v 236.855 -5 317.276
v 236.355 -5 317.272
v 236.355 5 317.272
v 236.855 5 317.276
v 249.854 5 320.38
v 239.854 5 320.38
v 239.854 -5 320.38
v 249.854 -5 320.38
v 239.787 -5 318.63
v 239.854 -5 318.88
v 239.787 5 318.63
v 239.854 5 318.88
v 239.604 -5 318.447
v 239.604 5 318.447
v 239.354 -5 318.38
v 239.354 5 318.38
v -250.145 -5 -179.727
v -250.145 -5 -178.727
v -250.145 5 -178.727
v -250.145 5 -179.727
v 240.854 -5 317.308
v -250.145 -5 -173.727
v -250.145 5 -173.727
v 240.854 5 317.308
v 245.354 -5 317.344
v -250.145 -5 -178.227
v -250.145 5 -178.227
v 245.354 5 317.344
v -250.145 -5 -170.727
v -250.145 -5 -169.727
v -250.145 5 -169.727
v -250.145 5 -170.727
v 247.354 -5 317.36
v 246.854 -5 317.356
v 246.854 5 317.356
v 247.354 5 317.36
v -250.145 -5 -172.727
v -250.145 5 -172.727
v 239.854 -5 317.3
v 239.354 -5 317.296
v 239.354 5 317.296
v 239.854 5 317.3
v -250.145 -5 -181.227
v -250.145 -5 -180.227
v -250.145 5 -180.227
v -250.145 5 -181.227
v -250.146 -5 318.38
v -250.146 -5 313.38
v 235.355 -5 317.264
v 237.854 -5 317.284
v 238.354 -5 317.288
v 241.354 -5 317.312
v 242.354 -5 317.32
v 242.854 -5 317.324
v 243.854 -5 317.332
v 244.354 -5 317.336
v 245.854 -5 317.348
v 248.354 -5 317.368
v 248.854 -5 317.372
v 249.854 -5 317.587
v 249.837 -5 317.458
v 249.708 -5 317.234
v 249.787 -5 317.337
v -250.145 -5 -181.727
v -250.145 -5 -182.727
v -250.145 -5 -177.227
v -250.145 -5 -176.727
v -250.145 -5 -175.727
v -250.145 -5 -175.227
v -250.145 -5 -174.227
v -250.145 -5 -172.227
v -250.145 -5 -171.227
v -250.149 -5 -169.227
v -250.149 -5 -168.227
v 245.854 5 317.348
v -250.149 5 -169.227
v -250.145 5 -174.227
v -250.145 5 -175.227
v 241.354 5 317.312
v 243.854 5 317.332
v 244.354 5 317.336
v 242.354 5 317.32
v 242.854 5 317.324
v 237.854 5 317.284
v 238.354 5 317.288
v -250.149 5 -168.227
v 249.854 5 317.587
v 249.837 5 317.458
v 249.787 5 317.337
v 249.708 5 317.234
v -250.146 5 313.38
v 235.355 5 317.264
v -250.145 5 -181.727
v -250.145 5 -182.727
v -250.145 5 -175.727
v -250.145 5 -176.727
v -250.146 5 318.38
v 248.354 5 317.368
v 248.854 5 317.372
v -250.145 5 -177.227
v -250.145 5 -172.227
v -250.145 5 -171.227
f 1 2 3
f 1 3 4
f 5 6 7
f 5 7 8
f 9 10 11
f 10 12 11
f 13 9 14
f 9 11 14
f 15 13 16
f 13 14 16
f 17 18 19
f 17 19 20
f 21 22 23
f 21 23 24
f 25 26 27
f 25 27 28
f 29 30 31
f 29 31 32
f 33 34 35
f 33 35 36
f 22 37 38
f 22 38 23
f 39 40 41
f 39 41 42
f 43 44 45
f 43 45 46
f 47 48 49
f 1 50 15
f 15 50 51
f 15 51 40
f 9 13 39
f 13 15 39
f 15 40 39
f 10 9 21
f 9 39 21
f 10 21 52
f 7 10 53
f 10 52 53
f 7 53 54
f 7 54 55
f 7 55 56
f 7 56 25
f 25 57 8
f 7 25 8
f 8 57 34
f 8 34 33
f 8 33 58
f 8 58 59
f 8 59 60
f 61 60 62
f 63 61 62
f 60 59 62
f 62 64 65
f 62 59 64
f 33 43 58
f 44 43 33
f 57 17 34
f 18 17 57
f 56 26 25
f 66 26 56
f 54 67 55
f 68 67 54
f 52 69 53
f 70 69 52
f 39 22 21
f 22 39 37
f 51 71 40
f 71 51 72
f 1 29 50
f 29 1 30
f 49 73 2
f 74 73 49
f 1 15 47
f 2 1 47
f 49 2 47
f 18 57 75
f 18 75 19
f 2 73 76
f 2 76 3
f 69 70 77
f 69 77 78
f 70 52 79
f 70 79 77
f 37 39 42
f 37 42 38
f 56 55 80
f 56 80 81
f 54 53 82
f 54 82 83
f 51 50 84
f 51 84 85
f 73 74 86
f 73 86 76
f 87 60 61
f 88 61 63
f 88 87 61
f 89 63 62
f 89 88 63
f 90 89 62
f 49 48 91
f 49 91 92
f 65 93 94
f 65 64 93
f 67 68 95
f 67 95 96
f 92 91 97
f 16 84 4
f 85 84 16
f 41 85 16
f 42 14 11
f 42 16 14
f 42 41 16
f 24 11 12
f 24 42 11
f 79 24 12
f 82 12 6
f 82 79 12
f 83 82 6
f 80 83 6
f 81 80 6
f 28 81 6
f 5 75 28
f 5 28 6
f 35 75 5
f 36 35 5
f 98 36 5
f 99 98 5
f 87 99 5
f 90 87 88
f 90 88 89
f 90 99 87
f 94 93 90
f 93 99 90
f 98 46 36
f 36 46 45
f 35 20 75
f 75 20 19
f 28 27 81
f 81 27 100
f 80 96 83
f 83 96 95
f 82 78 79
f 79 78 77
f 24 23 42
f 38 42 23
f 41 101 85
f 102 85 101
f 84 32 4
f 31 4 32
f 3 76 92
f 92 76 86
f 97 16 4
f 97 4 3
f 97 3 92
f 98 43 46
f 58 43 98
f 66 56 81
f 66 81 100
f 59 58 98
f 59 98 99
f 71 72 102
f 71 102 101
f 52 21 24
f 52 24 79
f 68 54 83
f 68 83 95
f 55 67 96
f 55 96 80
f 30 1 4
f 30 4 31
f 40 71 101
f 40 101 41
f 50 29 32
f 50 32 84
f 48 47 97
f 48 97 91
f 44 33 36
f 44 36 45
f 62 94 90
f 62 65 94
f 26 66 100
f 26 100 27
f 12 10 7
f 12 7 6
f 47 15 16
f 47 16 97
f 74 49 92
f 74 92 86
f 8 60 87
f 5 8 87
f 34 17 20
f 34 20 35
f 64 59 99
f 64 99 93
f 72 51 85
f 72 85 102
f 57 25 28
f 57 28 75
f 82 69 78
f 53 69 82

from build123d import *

# Parameters (mm, degrees)
F1_DEPTH = 5
F3_W     = 10
F3_H     = 10
F4_DEPTH = 2
F5_R     = 0.5


with BuildPart() as f1:
    # F0 (on Front) → F1 (new body, symmetric)
    with BuildSketch(Plane.XZ):
        Polygon((249.854166, 317.379943), (249.854166, 318.379943), (-250.145834, 318.379943), (-250.145834, 313.379943), (235.354566, 317.263947), (236.354534, 317.271946), (236.854518, 317.275946), (237.854486, 317.283946), (238.35447, 317.287946), (239.354438, 317.295946), (239.854422, 317.299945), (240.85439, 317.307945), (241.354374, 317.311945), (242.354342, 317.319945), (242.854326, 317.323945), (243.854326, 317.331945), (244.354326, 317.335945), (245.354294, 317.343944), (245.854278, 317.347944), (246.854246, 317.355944), (247.354246, 317.359944), (248.354214, 317.367944), (248.854198, 317.371944), align=None)
        Polygon((-250.145461, -181.227054), (248.354214, 317.367944), (247.354246, 317.359944), (-250.145461, -180.227054), align=None)
        Polygon((-250.145461, -182.727054), (249.854166, 317.379943), (248.854198, 317.371944), (-250.145461, -181.727054), align=None)
        Polygon((-250.145461, -178.227054), (245.354294, 317.343944), (244.354326, 317.335945), (-250.145461, -177.227054), align=None)
        Polygon((-250.145461, -179.727054), (246.854246, 317.355944), (245.854278, 317.347944), (-250.145461, -178.727054), align=None)
        Polygon((240.85439, 317.307945), (239.854422, 317.299945), (-250.145461, -172.727054), (-250.145461, -173.727054), align=None)
        Polygon((-250.145461, -175.227054), (242.354342, 317.319945), (241.354374, 317.311945), (-250.145461, -174.227054), align=None)
        Polygon((-250.145461, -176.727054), (243.854326, 317.331945), (242.854326, 317.323945), (-250.145461, -175.727054), align=None)
        Polygon((239.354438, 317.295946), (238.35447, 317.287946), (-250.145461, -171.227054), (-250.145461, -172.227054), align=None)
        Polygon((237.854486, 317.283946), (236.854518, 317.275946), (-250.145461, -169.727054), (-250.145461, -170.727054), align=None)
        Polygon((236.354534, 317.271946), (235.354566, 317.263947), (-250.148691, -168.227064), (-250.148691, -169.227064), align=None)
    extrude(amount=F1_DEPTH, both=True)

    # F3 (on face) → F4 (join)
    with BuildSketch(Plane.XY.offset(318.379943)):
        with Locations((244.854166, 0)):
            Rectangle(F3_W, F3_H)
    extrude(amount=F4_DEPTH)

    # F5
    f5_edges = [f1.edges().sort_by_distance(p)[0] for p in [
        (239.854166, 0, 318.379943),
        (249.854166, 0, 317.379943),
    ]]
    fillet(f5_edges, radius=F5_R)


solid = f1.part
